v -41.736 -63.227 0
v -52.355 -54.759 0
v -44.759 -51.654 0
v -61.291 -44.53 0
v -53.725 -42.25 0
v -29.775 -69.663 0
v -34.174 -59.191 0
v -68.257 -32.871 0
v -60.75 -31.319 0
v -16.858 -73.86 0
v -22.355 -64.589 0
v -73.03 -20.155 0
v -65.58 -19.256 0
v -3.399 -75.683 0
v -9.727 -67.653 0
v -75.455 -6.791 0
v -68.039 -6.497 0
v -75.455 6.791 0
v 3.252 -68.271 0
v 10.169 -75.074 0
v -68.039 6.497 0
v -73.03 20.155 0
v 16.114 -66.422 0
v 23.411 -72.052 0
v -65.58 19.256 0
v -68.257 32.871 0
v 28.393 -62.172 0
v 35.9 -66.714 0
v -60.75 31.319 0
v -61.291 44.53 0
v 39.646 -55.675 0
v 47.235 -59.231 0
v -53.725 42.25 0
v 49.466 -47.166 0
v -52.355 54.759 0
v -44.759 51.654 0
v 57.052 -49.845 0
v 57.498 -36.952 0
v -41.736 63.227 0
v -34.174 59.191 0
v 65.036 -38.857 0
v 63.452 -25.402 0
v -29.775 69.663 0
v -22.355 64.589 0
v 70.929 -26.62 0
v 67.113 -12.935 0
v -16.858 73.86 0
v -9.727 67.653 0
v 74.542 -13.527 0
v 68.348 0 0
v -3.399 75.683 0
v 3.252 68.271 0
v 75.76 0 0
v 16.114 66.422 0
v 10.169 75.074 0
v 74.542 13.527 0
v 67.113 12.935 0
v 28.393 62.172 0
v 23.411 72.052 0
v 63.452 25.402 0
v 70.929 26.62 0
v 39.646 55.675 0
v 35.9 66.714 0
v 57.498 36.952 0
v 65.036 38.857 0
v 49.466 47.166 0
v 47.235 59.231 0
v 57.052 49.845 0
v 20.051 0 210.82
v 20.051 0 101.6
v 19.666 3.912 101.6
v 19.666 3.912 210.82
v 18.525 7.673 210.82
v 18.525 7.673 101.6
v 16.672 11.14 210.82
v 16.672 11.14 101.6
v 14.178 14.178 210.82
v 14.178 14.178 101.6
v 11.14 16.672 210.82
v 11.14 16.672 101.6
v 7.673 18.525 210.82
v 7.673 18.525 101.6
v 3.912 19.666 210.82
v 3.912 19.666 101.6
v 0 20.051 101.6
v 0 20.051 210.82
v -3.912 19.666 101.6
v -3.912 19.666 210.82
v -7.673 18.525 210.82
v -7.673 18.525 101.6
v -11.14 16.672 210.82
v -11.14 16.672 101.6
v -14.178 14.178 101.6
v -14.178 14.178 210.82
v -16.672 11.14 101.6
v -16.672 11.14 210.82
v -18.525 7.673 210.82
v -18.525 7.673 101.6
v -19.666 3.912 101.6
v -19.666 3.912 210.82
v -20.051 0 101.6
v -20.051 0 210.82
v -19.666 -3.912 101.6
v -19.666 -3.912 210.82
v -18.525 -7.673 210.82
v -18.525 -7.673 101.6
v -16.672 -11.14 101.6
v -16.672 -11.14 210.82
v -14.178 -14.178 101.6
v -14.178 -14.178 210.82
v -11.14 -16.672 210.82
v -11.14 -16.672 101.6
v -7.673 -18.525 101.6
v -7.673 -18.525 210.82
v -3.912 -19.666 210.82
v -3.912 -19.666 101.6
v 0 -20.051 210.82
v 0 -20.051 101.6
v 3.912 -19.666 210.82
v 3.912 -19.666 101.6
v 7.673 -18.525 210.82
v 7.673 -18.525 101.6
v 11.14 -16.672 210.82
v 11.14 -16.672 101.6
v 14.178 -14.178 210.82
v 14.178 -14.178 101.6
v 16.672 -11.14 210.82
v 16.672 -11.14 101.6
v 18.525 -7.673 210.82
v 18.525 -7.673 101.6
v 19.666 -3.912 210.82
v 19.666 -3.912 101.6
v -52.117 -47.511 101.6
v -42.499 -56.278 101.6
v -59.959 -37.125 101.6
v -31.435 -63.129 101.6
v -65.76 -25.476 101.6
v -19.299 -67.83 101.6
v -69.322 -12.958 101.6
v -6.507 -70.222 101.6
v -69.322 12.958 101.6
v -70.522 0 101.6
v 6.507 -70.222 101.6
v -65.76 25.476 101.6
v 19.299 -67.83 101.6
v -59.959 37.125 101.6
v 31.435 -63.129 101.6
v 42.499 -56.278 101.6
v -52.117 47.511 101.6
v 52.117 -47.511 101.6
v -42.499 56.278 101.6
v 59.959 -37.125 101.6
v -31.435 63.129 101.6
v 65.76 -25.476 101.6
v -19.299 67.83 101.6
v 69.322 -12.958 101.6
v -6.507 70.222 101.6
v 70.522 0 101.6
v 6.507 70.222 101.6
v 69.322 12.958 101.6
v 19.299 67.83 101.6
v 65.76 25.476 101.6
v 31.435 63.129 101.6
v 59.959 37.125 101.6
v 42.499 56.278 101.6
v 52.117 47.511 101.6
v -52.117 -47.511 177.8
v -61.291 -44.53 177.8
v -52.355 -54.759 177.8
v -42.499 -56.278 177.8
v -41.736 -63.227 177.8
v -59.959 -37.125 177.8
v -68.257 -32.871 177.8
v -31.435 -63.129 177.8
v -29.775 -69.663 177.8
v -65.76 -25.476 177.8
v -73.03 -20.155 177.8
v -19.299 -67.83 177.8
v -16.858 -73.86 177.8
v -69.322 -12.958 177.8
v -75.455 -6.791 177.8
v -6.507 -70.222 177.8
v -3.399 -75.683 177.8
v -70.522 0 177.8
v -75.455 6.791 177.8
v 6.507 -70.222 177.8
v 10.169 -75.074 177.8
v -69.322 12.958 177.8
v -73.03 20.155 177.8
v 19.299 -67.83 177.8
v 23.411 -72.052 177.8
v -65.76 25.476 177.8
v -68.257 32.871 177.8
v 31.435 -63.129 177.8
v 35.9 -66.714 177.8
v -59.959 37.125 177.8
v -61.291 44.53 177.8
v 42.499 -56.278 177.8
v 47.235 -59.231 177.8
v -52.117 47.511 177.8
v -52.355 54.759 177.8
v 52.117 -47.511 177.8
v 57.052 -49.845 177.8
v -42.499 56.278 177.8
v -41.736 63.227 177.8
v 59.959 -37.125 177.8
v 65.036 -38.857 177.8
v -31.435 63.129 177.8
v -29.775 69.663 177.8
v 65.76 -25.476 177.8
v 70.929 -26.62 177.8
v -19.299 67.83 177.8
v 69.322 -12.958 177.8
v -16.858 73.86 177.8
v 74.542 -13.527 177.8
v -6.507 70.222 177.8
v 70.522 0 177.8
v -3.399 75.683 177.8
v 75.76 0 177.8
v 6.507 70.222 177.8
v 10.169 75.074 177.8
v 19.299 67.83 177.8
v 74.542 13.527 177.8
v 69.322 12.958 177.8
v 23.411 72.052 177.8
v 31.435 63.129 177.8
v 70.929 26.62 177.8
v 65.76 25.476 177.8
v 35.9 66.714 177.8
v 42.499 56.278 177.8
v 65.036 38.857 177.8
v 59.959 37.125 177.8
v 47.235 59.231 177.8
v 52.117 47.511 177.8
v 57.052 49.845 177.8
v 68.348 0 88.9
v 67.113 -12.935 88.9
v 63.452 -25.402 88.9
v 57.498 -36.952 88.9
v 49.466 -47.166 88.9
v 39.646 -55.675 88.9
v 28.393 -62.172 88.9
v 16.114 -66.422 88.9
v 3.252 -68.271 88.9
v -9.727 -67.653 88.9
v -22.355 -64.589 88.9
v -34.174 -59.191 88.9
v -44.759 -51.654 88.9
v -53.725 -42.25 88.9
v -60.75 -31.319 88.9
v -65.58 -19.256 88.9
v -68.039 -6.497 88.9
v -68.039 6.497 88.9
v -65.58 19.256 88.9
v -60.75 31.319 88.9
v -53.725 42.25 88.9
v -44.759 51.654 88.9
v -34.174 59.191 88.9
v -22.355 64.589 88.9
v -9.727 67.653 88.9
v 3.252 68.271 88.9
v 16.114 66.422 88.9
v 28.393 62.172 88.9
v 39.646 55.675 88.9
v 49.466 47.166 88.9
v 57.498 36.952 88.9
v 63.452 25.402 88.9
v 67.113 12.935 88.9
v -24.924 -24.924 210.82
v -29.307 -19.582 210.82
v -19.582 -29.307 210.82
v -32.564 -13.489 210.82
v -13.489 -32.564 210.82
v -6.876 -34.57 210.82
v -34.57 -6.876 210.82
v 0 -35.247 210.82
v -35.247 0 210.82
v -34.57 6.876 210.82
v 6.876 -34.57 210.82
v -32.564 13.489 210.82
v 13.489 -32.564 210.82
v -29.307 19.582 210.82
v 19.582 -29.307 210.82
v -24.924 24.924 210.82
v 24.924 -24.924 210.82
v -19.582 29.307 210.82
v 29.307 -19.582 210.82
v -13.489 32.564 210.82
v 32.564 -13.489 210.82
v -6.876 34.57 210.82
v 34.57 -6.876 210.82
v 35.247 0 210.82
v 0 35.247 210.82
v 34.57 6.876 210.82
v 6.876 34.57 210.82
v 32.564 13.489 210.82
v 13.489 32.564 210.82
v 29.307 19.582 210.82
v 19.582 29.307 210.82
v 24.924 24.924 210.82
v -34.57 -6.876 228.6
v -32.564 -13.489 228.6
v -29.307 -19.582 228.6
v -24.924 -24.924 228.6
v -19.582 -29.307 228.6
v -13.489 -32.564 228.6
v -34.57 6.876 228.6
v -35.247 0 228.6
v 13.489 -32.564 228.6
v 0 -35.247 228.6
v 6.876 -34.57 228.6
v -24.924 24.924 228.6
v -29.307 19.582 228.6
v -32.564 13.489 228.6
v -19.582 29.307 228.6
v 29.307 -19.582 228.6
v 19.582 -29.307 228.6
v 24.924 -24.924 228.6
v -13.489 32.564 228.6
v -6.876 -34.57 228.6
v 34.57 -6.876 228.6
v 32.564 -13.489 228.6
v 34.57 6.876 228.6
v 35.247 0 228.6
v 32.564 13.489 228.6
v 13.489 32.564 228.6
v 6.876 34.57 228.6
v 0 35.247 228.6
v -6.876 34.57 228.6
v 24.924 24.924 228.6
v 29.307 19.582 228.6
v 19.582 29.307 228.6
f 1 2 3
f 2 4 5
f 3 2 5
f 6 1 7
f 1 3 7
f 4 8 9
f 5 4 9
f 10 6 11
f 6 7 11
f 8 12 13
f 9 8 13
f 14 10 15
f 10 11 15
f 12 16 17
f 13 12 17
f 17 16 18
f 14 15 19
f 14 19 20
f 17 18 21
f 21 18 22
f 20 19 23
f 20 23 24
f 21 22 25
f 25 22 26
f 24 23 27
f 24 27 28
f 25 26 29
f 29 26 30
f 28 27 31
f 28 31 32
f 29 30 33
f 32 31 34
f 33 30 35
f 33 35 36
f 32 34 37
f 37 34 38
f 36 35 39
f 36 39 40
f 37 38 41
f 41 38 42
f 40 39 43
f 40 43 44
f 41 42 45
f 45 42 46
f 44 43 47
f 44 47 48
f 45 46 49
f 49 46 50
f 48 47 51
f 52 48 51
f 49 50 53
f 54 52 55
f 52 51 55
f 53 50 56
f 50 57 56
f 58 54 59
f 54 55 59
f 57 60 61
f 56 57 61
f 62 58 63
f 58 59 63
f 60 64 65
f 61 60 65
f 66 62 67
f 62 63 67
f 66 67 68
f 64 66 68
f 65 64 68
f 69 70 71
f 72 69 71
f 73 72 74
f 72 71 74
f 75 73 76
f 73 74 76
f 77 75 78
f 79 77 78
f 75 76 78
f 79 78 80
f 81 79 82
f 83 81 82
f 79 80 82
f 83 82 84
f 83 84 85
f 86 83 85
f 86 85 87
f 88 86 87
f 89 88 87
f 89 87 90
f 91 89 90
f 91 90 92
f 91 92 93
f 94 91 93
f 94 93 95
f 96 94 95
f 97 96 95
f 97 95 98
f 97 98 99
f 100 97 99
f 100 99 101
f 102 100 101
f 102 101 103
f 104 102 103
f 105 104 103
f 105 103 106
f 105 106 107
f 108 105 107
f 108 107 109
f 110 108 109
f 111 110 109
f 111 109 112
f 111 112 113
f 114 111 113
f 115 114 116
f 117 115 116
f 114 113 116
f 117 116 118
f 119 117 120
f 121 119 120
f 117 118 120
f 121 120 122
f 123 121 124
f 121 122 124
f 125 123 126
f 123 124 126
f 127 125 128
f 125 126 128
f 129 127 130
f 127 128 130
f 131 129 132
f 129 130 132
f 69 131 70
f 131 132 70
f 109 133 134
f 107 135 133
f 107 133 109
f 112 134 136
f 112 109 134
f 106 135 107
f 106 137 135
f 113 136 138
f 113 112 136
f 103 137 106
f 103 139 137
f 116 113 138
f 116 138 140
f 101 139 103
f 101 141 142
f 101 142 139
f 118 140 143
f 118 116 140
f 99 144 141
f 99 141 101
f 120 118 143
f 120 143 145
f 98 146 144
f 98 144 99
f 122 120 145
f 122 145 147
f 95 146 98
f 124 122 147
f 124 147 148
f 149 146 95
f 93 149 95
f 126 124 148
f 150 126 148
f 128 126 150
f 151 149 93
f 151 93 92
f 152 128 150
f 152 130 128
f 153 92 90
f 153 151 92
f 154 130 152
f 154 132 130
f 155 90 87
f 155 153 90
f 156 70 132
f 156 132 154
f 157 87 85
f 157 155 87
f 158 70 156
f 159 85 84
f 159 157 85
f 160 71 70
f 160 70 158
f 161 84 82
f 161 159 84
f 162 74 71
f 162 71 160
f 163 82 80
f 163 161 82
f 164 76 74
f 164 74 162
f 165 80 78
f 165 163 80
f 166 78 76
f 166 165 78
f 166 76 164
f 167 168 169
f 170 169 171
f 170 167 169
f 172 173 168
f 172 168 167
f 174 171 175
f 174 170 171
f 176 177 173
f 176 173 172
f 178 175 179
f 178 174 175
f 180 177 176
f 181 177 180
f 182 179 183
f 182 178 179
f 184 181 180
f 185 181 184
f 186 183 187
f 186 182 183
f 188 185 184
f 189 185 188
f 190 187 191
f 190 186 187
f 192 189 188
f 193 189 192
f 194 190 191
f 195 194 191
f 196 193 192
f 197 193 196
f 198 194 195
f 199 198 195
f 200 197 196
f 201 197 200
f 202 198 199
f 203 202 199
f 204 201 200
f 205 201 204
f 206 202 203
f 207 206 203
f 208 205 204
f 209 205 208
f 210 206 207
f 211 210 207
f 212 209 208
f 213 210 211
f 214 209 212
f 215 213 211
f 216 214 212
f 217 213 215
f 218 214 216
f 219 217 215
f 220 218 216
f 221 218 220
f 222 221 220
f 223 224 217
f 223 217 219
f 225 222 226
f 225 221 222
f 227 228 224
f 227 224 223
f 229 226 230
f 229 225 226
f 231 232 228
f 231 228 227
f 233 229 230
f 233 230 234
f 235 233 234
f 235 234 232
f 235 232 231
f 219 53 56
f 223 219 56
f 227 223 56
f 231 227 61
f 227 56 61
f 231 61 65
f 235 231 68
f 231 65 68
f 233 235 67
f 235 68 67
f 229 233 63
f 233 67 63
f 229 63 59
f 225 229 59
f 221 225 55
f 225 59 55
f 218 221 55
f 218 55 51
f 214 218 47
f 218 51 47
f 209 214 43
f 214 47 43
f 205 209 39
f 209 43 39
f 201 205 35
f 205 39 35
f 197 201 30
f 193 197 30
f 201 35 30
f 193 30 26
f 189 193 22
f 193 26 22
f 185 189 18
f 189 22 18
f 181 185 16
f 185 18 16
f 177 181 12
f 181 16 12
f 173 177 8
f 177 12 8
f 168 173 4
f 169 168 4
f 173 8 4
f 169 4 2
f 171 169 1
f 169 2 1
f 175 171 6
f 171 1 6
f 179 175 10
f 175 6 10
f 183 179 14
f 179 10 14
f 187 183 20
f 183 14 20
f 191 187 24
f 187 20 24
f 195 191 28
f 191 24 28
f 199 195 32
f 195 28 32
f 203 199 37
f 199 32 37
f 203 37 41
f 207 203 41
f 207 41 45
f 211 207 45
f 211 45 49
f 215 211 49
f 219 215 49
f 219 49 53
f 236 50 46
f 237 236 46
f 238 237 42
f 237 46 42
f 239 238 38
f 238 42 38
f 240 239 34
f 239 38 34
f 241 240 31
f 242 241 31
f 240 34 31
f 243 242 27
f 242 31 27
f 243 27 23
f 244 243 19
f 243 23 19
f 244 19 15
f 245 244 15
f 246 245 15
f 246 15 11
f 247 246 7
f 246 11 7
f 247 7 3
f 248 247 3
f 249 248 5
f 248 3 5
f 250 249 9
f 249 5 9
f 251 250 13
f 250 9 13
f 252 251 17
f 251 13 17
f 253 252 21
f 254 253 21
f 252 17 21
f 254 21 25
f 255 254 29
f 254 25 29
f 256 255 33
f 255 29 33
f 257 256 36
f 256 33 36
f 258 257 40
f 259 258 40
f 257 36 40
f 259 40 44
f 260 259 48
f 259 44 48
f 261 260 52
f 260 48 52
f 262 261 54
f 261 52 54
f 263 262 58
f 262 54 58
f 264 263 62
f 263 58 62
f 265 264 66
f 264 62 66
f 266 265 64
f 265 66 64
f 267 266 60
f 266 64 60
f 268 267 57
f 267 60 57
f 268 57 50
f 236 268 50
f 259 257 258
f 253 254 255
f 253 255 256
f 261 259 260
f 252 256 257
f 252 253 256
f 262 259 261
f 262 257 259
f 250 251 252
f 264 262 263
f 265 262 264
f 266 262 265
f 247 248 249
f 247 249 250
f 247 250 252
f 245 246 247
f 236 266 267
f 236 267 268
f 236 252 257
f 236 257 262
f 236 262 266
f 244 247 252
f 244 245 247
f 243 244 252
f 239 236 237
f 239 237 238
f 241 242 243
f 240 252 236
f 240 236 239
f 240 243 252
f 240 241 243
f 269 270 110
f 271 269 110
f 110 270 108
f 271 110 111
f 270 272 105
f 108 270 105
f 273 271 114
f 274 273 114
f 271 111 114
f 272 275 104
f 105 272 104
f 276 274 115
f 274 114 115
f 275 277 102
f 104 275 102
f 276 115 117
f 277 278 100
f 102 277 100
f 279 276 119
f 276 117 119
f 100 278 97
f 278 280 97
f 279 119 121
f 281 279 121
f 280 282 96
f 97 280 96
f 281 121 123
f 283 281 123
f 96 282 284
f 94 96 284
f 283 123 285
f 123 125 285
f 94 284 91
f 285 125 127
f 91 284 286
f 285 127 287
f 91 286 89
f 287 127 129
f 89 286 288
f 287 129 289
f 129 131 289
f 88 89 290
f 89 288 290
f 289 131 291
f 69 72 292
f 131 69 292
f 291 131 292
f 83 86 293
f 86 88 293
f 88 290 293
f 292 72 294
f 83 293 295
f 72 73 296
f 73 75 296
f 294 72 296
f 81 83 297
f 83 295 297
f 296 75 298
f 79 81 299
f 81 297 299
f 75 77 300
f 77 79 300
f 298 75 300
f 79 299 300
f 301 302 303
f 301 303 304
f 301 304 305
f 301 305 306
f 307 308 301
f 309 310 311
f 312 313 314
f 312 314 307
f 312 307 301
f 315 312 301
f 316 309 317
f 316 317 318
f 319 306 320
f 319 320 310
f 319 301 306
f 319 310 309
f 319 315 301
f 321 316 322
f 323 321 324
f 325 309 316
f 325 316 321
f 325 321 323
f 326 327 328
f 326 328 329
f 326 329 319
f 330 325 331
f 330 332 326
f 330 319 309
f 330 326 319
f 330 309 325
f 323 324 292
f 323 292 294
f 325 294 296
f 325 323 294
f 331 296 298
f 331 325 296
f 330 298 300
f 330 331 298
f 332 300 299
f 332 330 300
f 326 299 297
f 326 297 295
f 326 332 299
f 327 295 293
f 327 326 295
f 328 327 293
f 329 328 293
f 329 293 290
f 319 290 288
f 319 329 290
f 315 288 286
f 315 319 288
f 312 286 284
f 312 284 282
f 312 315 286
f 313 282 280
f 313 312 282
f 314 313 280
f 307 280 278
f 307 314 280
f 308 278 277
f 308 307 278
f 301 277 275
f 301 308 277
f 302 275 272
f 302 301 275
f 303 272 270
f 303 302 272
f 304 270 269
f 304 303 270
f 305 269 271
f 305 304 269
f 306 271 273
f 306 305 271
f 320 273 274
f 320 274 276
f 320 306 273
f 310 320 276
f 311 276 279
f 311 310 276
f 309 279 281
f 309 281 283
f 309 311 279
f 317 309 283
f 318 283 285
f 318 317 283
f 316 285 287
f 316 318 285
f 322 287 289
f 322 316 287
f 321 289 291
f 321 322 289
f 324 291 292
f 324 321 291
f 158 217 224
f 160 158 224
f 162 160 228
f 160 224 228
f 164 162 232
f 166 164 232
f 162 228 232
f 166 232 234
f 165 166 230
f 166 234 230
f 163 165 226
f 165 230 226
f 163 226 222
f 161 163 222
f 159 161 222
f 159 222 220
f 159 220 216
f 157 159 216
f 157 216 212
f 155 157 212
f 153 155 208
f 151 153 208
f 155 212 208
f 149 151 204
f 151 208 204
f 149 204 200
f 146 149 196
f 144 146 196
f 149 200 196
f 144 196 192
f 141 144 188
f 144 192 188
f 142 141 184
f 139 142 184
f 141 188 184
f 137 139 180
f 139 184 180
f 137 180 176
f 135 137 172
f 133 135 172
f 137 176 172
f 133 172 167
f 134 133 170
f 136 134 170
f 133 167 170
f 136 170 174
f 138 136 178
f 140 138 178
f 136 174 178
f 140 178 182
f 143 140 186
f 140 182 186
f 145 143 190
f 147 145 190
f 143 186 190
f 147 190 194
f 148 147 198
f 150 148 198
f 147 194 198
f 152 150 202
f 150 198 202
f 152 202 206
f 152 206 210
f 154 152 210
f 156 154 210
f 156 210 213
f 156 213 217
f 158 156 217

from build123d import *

# Parameters (mm, degrees)
F0_R     = 75.759685
F1_DEPTH = 177.8
F2_R     = 70.52244
F3_DEPTH = 76.2
F4_R     = 20.051342
F5_DEPTH = 127
F6_R     = 35.247261
F6_R_2   = 20.051342
F7_DEPTH = 17.78
F8_R     = 68.34828
F9_DEPTH = 88.9


with BuildPart() as f1:
    # F0 (on Top) → F1 (new body)
    with BuildSketch(Plane.XY):
        Circle(F0_R)
    extrude(amount=F1_DEPTH)

    # F2 (on face) → F3 (cut)
    with BuildSketch(Plane.XY.offset(177.8)):
        Circle(F2_R)
    extrude(amount=-F3_DEPTH, mode=Mode.SUBTRACT)

    # F4 (on face) → F5 (join)
    with BuildSketch(Plane.XY.offset(101.6)):
        Circle(F4_R)
    extrude(amount=F5_DEPTH)

    # F6 (on face) → F7 (join)
    with BuildSketch(Plane.XY.offset(228.6)):
        Circle(F6_R)
        Circle(F6_R_2, mode=Mode.SUBTRACT)
    extrude(amount=-F7_DEPTH)

    # F8 (on face) → F9 (cut)
    with BuildSketch(Plane(origin=(0, 0, 0), x_dir=(1, 0, 0), z_dir=(0, 0, -1))):
        Circle(F8_R)
    extrude(amount=-F9_DEPTH, mode=Mode.SUBTRACT)


solid = f1.part
